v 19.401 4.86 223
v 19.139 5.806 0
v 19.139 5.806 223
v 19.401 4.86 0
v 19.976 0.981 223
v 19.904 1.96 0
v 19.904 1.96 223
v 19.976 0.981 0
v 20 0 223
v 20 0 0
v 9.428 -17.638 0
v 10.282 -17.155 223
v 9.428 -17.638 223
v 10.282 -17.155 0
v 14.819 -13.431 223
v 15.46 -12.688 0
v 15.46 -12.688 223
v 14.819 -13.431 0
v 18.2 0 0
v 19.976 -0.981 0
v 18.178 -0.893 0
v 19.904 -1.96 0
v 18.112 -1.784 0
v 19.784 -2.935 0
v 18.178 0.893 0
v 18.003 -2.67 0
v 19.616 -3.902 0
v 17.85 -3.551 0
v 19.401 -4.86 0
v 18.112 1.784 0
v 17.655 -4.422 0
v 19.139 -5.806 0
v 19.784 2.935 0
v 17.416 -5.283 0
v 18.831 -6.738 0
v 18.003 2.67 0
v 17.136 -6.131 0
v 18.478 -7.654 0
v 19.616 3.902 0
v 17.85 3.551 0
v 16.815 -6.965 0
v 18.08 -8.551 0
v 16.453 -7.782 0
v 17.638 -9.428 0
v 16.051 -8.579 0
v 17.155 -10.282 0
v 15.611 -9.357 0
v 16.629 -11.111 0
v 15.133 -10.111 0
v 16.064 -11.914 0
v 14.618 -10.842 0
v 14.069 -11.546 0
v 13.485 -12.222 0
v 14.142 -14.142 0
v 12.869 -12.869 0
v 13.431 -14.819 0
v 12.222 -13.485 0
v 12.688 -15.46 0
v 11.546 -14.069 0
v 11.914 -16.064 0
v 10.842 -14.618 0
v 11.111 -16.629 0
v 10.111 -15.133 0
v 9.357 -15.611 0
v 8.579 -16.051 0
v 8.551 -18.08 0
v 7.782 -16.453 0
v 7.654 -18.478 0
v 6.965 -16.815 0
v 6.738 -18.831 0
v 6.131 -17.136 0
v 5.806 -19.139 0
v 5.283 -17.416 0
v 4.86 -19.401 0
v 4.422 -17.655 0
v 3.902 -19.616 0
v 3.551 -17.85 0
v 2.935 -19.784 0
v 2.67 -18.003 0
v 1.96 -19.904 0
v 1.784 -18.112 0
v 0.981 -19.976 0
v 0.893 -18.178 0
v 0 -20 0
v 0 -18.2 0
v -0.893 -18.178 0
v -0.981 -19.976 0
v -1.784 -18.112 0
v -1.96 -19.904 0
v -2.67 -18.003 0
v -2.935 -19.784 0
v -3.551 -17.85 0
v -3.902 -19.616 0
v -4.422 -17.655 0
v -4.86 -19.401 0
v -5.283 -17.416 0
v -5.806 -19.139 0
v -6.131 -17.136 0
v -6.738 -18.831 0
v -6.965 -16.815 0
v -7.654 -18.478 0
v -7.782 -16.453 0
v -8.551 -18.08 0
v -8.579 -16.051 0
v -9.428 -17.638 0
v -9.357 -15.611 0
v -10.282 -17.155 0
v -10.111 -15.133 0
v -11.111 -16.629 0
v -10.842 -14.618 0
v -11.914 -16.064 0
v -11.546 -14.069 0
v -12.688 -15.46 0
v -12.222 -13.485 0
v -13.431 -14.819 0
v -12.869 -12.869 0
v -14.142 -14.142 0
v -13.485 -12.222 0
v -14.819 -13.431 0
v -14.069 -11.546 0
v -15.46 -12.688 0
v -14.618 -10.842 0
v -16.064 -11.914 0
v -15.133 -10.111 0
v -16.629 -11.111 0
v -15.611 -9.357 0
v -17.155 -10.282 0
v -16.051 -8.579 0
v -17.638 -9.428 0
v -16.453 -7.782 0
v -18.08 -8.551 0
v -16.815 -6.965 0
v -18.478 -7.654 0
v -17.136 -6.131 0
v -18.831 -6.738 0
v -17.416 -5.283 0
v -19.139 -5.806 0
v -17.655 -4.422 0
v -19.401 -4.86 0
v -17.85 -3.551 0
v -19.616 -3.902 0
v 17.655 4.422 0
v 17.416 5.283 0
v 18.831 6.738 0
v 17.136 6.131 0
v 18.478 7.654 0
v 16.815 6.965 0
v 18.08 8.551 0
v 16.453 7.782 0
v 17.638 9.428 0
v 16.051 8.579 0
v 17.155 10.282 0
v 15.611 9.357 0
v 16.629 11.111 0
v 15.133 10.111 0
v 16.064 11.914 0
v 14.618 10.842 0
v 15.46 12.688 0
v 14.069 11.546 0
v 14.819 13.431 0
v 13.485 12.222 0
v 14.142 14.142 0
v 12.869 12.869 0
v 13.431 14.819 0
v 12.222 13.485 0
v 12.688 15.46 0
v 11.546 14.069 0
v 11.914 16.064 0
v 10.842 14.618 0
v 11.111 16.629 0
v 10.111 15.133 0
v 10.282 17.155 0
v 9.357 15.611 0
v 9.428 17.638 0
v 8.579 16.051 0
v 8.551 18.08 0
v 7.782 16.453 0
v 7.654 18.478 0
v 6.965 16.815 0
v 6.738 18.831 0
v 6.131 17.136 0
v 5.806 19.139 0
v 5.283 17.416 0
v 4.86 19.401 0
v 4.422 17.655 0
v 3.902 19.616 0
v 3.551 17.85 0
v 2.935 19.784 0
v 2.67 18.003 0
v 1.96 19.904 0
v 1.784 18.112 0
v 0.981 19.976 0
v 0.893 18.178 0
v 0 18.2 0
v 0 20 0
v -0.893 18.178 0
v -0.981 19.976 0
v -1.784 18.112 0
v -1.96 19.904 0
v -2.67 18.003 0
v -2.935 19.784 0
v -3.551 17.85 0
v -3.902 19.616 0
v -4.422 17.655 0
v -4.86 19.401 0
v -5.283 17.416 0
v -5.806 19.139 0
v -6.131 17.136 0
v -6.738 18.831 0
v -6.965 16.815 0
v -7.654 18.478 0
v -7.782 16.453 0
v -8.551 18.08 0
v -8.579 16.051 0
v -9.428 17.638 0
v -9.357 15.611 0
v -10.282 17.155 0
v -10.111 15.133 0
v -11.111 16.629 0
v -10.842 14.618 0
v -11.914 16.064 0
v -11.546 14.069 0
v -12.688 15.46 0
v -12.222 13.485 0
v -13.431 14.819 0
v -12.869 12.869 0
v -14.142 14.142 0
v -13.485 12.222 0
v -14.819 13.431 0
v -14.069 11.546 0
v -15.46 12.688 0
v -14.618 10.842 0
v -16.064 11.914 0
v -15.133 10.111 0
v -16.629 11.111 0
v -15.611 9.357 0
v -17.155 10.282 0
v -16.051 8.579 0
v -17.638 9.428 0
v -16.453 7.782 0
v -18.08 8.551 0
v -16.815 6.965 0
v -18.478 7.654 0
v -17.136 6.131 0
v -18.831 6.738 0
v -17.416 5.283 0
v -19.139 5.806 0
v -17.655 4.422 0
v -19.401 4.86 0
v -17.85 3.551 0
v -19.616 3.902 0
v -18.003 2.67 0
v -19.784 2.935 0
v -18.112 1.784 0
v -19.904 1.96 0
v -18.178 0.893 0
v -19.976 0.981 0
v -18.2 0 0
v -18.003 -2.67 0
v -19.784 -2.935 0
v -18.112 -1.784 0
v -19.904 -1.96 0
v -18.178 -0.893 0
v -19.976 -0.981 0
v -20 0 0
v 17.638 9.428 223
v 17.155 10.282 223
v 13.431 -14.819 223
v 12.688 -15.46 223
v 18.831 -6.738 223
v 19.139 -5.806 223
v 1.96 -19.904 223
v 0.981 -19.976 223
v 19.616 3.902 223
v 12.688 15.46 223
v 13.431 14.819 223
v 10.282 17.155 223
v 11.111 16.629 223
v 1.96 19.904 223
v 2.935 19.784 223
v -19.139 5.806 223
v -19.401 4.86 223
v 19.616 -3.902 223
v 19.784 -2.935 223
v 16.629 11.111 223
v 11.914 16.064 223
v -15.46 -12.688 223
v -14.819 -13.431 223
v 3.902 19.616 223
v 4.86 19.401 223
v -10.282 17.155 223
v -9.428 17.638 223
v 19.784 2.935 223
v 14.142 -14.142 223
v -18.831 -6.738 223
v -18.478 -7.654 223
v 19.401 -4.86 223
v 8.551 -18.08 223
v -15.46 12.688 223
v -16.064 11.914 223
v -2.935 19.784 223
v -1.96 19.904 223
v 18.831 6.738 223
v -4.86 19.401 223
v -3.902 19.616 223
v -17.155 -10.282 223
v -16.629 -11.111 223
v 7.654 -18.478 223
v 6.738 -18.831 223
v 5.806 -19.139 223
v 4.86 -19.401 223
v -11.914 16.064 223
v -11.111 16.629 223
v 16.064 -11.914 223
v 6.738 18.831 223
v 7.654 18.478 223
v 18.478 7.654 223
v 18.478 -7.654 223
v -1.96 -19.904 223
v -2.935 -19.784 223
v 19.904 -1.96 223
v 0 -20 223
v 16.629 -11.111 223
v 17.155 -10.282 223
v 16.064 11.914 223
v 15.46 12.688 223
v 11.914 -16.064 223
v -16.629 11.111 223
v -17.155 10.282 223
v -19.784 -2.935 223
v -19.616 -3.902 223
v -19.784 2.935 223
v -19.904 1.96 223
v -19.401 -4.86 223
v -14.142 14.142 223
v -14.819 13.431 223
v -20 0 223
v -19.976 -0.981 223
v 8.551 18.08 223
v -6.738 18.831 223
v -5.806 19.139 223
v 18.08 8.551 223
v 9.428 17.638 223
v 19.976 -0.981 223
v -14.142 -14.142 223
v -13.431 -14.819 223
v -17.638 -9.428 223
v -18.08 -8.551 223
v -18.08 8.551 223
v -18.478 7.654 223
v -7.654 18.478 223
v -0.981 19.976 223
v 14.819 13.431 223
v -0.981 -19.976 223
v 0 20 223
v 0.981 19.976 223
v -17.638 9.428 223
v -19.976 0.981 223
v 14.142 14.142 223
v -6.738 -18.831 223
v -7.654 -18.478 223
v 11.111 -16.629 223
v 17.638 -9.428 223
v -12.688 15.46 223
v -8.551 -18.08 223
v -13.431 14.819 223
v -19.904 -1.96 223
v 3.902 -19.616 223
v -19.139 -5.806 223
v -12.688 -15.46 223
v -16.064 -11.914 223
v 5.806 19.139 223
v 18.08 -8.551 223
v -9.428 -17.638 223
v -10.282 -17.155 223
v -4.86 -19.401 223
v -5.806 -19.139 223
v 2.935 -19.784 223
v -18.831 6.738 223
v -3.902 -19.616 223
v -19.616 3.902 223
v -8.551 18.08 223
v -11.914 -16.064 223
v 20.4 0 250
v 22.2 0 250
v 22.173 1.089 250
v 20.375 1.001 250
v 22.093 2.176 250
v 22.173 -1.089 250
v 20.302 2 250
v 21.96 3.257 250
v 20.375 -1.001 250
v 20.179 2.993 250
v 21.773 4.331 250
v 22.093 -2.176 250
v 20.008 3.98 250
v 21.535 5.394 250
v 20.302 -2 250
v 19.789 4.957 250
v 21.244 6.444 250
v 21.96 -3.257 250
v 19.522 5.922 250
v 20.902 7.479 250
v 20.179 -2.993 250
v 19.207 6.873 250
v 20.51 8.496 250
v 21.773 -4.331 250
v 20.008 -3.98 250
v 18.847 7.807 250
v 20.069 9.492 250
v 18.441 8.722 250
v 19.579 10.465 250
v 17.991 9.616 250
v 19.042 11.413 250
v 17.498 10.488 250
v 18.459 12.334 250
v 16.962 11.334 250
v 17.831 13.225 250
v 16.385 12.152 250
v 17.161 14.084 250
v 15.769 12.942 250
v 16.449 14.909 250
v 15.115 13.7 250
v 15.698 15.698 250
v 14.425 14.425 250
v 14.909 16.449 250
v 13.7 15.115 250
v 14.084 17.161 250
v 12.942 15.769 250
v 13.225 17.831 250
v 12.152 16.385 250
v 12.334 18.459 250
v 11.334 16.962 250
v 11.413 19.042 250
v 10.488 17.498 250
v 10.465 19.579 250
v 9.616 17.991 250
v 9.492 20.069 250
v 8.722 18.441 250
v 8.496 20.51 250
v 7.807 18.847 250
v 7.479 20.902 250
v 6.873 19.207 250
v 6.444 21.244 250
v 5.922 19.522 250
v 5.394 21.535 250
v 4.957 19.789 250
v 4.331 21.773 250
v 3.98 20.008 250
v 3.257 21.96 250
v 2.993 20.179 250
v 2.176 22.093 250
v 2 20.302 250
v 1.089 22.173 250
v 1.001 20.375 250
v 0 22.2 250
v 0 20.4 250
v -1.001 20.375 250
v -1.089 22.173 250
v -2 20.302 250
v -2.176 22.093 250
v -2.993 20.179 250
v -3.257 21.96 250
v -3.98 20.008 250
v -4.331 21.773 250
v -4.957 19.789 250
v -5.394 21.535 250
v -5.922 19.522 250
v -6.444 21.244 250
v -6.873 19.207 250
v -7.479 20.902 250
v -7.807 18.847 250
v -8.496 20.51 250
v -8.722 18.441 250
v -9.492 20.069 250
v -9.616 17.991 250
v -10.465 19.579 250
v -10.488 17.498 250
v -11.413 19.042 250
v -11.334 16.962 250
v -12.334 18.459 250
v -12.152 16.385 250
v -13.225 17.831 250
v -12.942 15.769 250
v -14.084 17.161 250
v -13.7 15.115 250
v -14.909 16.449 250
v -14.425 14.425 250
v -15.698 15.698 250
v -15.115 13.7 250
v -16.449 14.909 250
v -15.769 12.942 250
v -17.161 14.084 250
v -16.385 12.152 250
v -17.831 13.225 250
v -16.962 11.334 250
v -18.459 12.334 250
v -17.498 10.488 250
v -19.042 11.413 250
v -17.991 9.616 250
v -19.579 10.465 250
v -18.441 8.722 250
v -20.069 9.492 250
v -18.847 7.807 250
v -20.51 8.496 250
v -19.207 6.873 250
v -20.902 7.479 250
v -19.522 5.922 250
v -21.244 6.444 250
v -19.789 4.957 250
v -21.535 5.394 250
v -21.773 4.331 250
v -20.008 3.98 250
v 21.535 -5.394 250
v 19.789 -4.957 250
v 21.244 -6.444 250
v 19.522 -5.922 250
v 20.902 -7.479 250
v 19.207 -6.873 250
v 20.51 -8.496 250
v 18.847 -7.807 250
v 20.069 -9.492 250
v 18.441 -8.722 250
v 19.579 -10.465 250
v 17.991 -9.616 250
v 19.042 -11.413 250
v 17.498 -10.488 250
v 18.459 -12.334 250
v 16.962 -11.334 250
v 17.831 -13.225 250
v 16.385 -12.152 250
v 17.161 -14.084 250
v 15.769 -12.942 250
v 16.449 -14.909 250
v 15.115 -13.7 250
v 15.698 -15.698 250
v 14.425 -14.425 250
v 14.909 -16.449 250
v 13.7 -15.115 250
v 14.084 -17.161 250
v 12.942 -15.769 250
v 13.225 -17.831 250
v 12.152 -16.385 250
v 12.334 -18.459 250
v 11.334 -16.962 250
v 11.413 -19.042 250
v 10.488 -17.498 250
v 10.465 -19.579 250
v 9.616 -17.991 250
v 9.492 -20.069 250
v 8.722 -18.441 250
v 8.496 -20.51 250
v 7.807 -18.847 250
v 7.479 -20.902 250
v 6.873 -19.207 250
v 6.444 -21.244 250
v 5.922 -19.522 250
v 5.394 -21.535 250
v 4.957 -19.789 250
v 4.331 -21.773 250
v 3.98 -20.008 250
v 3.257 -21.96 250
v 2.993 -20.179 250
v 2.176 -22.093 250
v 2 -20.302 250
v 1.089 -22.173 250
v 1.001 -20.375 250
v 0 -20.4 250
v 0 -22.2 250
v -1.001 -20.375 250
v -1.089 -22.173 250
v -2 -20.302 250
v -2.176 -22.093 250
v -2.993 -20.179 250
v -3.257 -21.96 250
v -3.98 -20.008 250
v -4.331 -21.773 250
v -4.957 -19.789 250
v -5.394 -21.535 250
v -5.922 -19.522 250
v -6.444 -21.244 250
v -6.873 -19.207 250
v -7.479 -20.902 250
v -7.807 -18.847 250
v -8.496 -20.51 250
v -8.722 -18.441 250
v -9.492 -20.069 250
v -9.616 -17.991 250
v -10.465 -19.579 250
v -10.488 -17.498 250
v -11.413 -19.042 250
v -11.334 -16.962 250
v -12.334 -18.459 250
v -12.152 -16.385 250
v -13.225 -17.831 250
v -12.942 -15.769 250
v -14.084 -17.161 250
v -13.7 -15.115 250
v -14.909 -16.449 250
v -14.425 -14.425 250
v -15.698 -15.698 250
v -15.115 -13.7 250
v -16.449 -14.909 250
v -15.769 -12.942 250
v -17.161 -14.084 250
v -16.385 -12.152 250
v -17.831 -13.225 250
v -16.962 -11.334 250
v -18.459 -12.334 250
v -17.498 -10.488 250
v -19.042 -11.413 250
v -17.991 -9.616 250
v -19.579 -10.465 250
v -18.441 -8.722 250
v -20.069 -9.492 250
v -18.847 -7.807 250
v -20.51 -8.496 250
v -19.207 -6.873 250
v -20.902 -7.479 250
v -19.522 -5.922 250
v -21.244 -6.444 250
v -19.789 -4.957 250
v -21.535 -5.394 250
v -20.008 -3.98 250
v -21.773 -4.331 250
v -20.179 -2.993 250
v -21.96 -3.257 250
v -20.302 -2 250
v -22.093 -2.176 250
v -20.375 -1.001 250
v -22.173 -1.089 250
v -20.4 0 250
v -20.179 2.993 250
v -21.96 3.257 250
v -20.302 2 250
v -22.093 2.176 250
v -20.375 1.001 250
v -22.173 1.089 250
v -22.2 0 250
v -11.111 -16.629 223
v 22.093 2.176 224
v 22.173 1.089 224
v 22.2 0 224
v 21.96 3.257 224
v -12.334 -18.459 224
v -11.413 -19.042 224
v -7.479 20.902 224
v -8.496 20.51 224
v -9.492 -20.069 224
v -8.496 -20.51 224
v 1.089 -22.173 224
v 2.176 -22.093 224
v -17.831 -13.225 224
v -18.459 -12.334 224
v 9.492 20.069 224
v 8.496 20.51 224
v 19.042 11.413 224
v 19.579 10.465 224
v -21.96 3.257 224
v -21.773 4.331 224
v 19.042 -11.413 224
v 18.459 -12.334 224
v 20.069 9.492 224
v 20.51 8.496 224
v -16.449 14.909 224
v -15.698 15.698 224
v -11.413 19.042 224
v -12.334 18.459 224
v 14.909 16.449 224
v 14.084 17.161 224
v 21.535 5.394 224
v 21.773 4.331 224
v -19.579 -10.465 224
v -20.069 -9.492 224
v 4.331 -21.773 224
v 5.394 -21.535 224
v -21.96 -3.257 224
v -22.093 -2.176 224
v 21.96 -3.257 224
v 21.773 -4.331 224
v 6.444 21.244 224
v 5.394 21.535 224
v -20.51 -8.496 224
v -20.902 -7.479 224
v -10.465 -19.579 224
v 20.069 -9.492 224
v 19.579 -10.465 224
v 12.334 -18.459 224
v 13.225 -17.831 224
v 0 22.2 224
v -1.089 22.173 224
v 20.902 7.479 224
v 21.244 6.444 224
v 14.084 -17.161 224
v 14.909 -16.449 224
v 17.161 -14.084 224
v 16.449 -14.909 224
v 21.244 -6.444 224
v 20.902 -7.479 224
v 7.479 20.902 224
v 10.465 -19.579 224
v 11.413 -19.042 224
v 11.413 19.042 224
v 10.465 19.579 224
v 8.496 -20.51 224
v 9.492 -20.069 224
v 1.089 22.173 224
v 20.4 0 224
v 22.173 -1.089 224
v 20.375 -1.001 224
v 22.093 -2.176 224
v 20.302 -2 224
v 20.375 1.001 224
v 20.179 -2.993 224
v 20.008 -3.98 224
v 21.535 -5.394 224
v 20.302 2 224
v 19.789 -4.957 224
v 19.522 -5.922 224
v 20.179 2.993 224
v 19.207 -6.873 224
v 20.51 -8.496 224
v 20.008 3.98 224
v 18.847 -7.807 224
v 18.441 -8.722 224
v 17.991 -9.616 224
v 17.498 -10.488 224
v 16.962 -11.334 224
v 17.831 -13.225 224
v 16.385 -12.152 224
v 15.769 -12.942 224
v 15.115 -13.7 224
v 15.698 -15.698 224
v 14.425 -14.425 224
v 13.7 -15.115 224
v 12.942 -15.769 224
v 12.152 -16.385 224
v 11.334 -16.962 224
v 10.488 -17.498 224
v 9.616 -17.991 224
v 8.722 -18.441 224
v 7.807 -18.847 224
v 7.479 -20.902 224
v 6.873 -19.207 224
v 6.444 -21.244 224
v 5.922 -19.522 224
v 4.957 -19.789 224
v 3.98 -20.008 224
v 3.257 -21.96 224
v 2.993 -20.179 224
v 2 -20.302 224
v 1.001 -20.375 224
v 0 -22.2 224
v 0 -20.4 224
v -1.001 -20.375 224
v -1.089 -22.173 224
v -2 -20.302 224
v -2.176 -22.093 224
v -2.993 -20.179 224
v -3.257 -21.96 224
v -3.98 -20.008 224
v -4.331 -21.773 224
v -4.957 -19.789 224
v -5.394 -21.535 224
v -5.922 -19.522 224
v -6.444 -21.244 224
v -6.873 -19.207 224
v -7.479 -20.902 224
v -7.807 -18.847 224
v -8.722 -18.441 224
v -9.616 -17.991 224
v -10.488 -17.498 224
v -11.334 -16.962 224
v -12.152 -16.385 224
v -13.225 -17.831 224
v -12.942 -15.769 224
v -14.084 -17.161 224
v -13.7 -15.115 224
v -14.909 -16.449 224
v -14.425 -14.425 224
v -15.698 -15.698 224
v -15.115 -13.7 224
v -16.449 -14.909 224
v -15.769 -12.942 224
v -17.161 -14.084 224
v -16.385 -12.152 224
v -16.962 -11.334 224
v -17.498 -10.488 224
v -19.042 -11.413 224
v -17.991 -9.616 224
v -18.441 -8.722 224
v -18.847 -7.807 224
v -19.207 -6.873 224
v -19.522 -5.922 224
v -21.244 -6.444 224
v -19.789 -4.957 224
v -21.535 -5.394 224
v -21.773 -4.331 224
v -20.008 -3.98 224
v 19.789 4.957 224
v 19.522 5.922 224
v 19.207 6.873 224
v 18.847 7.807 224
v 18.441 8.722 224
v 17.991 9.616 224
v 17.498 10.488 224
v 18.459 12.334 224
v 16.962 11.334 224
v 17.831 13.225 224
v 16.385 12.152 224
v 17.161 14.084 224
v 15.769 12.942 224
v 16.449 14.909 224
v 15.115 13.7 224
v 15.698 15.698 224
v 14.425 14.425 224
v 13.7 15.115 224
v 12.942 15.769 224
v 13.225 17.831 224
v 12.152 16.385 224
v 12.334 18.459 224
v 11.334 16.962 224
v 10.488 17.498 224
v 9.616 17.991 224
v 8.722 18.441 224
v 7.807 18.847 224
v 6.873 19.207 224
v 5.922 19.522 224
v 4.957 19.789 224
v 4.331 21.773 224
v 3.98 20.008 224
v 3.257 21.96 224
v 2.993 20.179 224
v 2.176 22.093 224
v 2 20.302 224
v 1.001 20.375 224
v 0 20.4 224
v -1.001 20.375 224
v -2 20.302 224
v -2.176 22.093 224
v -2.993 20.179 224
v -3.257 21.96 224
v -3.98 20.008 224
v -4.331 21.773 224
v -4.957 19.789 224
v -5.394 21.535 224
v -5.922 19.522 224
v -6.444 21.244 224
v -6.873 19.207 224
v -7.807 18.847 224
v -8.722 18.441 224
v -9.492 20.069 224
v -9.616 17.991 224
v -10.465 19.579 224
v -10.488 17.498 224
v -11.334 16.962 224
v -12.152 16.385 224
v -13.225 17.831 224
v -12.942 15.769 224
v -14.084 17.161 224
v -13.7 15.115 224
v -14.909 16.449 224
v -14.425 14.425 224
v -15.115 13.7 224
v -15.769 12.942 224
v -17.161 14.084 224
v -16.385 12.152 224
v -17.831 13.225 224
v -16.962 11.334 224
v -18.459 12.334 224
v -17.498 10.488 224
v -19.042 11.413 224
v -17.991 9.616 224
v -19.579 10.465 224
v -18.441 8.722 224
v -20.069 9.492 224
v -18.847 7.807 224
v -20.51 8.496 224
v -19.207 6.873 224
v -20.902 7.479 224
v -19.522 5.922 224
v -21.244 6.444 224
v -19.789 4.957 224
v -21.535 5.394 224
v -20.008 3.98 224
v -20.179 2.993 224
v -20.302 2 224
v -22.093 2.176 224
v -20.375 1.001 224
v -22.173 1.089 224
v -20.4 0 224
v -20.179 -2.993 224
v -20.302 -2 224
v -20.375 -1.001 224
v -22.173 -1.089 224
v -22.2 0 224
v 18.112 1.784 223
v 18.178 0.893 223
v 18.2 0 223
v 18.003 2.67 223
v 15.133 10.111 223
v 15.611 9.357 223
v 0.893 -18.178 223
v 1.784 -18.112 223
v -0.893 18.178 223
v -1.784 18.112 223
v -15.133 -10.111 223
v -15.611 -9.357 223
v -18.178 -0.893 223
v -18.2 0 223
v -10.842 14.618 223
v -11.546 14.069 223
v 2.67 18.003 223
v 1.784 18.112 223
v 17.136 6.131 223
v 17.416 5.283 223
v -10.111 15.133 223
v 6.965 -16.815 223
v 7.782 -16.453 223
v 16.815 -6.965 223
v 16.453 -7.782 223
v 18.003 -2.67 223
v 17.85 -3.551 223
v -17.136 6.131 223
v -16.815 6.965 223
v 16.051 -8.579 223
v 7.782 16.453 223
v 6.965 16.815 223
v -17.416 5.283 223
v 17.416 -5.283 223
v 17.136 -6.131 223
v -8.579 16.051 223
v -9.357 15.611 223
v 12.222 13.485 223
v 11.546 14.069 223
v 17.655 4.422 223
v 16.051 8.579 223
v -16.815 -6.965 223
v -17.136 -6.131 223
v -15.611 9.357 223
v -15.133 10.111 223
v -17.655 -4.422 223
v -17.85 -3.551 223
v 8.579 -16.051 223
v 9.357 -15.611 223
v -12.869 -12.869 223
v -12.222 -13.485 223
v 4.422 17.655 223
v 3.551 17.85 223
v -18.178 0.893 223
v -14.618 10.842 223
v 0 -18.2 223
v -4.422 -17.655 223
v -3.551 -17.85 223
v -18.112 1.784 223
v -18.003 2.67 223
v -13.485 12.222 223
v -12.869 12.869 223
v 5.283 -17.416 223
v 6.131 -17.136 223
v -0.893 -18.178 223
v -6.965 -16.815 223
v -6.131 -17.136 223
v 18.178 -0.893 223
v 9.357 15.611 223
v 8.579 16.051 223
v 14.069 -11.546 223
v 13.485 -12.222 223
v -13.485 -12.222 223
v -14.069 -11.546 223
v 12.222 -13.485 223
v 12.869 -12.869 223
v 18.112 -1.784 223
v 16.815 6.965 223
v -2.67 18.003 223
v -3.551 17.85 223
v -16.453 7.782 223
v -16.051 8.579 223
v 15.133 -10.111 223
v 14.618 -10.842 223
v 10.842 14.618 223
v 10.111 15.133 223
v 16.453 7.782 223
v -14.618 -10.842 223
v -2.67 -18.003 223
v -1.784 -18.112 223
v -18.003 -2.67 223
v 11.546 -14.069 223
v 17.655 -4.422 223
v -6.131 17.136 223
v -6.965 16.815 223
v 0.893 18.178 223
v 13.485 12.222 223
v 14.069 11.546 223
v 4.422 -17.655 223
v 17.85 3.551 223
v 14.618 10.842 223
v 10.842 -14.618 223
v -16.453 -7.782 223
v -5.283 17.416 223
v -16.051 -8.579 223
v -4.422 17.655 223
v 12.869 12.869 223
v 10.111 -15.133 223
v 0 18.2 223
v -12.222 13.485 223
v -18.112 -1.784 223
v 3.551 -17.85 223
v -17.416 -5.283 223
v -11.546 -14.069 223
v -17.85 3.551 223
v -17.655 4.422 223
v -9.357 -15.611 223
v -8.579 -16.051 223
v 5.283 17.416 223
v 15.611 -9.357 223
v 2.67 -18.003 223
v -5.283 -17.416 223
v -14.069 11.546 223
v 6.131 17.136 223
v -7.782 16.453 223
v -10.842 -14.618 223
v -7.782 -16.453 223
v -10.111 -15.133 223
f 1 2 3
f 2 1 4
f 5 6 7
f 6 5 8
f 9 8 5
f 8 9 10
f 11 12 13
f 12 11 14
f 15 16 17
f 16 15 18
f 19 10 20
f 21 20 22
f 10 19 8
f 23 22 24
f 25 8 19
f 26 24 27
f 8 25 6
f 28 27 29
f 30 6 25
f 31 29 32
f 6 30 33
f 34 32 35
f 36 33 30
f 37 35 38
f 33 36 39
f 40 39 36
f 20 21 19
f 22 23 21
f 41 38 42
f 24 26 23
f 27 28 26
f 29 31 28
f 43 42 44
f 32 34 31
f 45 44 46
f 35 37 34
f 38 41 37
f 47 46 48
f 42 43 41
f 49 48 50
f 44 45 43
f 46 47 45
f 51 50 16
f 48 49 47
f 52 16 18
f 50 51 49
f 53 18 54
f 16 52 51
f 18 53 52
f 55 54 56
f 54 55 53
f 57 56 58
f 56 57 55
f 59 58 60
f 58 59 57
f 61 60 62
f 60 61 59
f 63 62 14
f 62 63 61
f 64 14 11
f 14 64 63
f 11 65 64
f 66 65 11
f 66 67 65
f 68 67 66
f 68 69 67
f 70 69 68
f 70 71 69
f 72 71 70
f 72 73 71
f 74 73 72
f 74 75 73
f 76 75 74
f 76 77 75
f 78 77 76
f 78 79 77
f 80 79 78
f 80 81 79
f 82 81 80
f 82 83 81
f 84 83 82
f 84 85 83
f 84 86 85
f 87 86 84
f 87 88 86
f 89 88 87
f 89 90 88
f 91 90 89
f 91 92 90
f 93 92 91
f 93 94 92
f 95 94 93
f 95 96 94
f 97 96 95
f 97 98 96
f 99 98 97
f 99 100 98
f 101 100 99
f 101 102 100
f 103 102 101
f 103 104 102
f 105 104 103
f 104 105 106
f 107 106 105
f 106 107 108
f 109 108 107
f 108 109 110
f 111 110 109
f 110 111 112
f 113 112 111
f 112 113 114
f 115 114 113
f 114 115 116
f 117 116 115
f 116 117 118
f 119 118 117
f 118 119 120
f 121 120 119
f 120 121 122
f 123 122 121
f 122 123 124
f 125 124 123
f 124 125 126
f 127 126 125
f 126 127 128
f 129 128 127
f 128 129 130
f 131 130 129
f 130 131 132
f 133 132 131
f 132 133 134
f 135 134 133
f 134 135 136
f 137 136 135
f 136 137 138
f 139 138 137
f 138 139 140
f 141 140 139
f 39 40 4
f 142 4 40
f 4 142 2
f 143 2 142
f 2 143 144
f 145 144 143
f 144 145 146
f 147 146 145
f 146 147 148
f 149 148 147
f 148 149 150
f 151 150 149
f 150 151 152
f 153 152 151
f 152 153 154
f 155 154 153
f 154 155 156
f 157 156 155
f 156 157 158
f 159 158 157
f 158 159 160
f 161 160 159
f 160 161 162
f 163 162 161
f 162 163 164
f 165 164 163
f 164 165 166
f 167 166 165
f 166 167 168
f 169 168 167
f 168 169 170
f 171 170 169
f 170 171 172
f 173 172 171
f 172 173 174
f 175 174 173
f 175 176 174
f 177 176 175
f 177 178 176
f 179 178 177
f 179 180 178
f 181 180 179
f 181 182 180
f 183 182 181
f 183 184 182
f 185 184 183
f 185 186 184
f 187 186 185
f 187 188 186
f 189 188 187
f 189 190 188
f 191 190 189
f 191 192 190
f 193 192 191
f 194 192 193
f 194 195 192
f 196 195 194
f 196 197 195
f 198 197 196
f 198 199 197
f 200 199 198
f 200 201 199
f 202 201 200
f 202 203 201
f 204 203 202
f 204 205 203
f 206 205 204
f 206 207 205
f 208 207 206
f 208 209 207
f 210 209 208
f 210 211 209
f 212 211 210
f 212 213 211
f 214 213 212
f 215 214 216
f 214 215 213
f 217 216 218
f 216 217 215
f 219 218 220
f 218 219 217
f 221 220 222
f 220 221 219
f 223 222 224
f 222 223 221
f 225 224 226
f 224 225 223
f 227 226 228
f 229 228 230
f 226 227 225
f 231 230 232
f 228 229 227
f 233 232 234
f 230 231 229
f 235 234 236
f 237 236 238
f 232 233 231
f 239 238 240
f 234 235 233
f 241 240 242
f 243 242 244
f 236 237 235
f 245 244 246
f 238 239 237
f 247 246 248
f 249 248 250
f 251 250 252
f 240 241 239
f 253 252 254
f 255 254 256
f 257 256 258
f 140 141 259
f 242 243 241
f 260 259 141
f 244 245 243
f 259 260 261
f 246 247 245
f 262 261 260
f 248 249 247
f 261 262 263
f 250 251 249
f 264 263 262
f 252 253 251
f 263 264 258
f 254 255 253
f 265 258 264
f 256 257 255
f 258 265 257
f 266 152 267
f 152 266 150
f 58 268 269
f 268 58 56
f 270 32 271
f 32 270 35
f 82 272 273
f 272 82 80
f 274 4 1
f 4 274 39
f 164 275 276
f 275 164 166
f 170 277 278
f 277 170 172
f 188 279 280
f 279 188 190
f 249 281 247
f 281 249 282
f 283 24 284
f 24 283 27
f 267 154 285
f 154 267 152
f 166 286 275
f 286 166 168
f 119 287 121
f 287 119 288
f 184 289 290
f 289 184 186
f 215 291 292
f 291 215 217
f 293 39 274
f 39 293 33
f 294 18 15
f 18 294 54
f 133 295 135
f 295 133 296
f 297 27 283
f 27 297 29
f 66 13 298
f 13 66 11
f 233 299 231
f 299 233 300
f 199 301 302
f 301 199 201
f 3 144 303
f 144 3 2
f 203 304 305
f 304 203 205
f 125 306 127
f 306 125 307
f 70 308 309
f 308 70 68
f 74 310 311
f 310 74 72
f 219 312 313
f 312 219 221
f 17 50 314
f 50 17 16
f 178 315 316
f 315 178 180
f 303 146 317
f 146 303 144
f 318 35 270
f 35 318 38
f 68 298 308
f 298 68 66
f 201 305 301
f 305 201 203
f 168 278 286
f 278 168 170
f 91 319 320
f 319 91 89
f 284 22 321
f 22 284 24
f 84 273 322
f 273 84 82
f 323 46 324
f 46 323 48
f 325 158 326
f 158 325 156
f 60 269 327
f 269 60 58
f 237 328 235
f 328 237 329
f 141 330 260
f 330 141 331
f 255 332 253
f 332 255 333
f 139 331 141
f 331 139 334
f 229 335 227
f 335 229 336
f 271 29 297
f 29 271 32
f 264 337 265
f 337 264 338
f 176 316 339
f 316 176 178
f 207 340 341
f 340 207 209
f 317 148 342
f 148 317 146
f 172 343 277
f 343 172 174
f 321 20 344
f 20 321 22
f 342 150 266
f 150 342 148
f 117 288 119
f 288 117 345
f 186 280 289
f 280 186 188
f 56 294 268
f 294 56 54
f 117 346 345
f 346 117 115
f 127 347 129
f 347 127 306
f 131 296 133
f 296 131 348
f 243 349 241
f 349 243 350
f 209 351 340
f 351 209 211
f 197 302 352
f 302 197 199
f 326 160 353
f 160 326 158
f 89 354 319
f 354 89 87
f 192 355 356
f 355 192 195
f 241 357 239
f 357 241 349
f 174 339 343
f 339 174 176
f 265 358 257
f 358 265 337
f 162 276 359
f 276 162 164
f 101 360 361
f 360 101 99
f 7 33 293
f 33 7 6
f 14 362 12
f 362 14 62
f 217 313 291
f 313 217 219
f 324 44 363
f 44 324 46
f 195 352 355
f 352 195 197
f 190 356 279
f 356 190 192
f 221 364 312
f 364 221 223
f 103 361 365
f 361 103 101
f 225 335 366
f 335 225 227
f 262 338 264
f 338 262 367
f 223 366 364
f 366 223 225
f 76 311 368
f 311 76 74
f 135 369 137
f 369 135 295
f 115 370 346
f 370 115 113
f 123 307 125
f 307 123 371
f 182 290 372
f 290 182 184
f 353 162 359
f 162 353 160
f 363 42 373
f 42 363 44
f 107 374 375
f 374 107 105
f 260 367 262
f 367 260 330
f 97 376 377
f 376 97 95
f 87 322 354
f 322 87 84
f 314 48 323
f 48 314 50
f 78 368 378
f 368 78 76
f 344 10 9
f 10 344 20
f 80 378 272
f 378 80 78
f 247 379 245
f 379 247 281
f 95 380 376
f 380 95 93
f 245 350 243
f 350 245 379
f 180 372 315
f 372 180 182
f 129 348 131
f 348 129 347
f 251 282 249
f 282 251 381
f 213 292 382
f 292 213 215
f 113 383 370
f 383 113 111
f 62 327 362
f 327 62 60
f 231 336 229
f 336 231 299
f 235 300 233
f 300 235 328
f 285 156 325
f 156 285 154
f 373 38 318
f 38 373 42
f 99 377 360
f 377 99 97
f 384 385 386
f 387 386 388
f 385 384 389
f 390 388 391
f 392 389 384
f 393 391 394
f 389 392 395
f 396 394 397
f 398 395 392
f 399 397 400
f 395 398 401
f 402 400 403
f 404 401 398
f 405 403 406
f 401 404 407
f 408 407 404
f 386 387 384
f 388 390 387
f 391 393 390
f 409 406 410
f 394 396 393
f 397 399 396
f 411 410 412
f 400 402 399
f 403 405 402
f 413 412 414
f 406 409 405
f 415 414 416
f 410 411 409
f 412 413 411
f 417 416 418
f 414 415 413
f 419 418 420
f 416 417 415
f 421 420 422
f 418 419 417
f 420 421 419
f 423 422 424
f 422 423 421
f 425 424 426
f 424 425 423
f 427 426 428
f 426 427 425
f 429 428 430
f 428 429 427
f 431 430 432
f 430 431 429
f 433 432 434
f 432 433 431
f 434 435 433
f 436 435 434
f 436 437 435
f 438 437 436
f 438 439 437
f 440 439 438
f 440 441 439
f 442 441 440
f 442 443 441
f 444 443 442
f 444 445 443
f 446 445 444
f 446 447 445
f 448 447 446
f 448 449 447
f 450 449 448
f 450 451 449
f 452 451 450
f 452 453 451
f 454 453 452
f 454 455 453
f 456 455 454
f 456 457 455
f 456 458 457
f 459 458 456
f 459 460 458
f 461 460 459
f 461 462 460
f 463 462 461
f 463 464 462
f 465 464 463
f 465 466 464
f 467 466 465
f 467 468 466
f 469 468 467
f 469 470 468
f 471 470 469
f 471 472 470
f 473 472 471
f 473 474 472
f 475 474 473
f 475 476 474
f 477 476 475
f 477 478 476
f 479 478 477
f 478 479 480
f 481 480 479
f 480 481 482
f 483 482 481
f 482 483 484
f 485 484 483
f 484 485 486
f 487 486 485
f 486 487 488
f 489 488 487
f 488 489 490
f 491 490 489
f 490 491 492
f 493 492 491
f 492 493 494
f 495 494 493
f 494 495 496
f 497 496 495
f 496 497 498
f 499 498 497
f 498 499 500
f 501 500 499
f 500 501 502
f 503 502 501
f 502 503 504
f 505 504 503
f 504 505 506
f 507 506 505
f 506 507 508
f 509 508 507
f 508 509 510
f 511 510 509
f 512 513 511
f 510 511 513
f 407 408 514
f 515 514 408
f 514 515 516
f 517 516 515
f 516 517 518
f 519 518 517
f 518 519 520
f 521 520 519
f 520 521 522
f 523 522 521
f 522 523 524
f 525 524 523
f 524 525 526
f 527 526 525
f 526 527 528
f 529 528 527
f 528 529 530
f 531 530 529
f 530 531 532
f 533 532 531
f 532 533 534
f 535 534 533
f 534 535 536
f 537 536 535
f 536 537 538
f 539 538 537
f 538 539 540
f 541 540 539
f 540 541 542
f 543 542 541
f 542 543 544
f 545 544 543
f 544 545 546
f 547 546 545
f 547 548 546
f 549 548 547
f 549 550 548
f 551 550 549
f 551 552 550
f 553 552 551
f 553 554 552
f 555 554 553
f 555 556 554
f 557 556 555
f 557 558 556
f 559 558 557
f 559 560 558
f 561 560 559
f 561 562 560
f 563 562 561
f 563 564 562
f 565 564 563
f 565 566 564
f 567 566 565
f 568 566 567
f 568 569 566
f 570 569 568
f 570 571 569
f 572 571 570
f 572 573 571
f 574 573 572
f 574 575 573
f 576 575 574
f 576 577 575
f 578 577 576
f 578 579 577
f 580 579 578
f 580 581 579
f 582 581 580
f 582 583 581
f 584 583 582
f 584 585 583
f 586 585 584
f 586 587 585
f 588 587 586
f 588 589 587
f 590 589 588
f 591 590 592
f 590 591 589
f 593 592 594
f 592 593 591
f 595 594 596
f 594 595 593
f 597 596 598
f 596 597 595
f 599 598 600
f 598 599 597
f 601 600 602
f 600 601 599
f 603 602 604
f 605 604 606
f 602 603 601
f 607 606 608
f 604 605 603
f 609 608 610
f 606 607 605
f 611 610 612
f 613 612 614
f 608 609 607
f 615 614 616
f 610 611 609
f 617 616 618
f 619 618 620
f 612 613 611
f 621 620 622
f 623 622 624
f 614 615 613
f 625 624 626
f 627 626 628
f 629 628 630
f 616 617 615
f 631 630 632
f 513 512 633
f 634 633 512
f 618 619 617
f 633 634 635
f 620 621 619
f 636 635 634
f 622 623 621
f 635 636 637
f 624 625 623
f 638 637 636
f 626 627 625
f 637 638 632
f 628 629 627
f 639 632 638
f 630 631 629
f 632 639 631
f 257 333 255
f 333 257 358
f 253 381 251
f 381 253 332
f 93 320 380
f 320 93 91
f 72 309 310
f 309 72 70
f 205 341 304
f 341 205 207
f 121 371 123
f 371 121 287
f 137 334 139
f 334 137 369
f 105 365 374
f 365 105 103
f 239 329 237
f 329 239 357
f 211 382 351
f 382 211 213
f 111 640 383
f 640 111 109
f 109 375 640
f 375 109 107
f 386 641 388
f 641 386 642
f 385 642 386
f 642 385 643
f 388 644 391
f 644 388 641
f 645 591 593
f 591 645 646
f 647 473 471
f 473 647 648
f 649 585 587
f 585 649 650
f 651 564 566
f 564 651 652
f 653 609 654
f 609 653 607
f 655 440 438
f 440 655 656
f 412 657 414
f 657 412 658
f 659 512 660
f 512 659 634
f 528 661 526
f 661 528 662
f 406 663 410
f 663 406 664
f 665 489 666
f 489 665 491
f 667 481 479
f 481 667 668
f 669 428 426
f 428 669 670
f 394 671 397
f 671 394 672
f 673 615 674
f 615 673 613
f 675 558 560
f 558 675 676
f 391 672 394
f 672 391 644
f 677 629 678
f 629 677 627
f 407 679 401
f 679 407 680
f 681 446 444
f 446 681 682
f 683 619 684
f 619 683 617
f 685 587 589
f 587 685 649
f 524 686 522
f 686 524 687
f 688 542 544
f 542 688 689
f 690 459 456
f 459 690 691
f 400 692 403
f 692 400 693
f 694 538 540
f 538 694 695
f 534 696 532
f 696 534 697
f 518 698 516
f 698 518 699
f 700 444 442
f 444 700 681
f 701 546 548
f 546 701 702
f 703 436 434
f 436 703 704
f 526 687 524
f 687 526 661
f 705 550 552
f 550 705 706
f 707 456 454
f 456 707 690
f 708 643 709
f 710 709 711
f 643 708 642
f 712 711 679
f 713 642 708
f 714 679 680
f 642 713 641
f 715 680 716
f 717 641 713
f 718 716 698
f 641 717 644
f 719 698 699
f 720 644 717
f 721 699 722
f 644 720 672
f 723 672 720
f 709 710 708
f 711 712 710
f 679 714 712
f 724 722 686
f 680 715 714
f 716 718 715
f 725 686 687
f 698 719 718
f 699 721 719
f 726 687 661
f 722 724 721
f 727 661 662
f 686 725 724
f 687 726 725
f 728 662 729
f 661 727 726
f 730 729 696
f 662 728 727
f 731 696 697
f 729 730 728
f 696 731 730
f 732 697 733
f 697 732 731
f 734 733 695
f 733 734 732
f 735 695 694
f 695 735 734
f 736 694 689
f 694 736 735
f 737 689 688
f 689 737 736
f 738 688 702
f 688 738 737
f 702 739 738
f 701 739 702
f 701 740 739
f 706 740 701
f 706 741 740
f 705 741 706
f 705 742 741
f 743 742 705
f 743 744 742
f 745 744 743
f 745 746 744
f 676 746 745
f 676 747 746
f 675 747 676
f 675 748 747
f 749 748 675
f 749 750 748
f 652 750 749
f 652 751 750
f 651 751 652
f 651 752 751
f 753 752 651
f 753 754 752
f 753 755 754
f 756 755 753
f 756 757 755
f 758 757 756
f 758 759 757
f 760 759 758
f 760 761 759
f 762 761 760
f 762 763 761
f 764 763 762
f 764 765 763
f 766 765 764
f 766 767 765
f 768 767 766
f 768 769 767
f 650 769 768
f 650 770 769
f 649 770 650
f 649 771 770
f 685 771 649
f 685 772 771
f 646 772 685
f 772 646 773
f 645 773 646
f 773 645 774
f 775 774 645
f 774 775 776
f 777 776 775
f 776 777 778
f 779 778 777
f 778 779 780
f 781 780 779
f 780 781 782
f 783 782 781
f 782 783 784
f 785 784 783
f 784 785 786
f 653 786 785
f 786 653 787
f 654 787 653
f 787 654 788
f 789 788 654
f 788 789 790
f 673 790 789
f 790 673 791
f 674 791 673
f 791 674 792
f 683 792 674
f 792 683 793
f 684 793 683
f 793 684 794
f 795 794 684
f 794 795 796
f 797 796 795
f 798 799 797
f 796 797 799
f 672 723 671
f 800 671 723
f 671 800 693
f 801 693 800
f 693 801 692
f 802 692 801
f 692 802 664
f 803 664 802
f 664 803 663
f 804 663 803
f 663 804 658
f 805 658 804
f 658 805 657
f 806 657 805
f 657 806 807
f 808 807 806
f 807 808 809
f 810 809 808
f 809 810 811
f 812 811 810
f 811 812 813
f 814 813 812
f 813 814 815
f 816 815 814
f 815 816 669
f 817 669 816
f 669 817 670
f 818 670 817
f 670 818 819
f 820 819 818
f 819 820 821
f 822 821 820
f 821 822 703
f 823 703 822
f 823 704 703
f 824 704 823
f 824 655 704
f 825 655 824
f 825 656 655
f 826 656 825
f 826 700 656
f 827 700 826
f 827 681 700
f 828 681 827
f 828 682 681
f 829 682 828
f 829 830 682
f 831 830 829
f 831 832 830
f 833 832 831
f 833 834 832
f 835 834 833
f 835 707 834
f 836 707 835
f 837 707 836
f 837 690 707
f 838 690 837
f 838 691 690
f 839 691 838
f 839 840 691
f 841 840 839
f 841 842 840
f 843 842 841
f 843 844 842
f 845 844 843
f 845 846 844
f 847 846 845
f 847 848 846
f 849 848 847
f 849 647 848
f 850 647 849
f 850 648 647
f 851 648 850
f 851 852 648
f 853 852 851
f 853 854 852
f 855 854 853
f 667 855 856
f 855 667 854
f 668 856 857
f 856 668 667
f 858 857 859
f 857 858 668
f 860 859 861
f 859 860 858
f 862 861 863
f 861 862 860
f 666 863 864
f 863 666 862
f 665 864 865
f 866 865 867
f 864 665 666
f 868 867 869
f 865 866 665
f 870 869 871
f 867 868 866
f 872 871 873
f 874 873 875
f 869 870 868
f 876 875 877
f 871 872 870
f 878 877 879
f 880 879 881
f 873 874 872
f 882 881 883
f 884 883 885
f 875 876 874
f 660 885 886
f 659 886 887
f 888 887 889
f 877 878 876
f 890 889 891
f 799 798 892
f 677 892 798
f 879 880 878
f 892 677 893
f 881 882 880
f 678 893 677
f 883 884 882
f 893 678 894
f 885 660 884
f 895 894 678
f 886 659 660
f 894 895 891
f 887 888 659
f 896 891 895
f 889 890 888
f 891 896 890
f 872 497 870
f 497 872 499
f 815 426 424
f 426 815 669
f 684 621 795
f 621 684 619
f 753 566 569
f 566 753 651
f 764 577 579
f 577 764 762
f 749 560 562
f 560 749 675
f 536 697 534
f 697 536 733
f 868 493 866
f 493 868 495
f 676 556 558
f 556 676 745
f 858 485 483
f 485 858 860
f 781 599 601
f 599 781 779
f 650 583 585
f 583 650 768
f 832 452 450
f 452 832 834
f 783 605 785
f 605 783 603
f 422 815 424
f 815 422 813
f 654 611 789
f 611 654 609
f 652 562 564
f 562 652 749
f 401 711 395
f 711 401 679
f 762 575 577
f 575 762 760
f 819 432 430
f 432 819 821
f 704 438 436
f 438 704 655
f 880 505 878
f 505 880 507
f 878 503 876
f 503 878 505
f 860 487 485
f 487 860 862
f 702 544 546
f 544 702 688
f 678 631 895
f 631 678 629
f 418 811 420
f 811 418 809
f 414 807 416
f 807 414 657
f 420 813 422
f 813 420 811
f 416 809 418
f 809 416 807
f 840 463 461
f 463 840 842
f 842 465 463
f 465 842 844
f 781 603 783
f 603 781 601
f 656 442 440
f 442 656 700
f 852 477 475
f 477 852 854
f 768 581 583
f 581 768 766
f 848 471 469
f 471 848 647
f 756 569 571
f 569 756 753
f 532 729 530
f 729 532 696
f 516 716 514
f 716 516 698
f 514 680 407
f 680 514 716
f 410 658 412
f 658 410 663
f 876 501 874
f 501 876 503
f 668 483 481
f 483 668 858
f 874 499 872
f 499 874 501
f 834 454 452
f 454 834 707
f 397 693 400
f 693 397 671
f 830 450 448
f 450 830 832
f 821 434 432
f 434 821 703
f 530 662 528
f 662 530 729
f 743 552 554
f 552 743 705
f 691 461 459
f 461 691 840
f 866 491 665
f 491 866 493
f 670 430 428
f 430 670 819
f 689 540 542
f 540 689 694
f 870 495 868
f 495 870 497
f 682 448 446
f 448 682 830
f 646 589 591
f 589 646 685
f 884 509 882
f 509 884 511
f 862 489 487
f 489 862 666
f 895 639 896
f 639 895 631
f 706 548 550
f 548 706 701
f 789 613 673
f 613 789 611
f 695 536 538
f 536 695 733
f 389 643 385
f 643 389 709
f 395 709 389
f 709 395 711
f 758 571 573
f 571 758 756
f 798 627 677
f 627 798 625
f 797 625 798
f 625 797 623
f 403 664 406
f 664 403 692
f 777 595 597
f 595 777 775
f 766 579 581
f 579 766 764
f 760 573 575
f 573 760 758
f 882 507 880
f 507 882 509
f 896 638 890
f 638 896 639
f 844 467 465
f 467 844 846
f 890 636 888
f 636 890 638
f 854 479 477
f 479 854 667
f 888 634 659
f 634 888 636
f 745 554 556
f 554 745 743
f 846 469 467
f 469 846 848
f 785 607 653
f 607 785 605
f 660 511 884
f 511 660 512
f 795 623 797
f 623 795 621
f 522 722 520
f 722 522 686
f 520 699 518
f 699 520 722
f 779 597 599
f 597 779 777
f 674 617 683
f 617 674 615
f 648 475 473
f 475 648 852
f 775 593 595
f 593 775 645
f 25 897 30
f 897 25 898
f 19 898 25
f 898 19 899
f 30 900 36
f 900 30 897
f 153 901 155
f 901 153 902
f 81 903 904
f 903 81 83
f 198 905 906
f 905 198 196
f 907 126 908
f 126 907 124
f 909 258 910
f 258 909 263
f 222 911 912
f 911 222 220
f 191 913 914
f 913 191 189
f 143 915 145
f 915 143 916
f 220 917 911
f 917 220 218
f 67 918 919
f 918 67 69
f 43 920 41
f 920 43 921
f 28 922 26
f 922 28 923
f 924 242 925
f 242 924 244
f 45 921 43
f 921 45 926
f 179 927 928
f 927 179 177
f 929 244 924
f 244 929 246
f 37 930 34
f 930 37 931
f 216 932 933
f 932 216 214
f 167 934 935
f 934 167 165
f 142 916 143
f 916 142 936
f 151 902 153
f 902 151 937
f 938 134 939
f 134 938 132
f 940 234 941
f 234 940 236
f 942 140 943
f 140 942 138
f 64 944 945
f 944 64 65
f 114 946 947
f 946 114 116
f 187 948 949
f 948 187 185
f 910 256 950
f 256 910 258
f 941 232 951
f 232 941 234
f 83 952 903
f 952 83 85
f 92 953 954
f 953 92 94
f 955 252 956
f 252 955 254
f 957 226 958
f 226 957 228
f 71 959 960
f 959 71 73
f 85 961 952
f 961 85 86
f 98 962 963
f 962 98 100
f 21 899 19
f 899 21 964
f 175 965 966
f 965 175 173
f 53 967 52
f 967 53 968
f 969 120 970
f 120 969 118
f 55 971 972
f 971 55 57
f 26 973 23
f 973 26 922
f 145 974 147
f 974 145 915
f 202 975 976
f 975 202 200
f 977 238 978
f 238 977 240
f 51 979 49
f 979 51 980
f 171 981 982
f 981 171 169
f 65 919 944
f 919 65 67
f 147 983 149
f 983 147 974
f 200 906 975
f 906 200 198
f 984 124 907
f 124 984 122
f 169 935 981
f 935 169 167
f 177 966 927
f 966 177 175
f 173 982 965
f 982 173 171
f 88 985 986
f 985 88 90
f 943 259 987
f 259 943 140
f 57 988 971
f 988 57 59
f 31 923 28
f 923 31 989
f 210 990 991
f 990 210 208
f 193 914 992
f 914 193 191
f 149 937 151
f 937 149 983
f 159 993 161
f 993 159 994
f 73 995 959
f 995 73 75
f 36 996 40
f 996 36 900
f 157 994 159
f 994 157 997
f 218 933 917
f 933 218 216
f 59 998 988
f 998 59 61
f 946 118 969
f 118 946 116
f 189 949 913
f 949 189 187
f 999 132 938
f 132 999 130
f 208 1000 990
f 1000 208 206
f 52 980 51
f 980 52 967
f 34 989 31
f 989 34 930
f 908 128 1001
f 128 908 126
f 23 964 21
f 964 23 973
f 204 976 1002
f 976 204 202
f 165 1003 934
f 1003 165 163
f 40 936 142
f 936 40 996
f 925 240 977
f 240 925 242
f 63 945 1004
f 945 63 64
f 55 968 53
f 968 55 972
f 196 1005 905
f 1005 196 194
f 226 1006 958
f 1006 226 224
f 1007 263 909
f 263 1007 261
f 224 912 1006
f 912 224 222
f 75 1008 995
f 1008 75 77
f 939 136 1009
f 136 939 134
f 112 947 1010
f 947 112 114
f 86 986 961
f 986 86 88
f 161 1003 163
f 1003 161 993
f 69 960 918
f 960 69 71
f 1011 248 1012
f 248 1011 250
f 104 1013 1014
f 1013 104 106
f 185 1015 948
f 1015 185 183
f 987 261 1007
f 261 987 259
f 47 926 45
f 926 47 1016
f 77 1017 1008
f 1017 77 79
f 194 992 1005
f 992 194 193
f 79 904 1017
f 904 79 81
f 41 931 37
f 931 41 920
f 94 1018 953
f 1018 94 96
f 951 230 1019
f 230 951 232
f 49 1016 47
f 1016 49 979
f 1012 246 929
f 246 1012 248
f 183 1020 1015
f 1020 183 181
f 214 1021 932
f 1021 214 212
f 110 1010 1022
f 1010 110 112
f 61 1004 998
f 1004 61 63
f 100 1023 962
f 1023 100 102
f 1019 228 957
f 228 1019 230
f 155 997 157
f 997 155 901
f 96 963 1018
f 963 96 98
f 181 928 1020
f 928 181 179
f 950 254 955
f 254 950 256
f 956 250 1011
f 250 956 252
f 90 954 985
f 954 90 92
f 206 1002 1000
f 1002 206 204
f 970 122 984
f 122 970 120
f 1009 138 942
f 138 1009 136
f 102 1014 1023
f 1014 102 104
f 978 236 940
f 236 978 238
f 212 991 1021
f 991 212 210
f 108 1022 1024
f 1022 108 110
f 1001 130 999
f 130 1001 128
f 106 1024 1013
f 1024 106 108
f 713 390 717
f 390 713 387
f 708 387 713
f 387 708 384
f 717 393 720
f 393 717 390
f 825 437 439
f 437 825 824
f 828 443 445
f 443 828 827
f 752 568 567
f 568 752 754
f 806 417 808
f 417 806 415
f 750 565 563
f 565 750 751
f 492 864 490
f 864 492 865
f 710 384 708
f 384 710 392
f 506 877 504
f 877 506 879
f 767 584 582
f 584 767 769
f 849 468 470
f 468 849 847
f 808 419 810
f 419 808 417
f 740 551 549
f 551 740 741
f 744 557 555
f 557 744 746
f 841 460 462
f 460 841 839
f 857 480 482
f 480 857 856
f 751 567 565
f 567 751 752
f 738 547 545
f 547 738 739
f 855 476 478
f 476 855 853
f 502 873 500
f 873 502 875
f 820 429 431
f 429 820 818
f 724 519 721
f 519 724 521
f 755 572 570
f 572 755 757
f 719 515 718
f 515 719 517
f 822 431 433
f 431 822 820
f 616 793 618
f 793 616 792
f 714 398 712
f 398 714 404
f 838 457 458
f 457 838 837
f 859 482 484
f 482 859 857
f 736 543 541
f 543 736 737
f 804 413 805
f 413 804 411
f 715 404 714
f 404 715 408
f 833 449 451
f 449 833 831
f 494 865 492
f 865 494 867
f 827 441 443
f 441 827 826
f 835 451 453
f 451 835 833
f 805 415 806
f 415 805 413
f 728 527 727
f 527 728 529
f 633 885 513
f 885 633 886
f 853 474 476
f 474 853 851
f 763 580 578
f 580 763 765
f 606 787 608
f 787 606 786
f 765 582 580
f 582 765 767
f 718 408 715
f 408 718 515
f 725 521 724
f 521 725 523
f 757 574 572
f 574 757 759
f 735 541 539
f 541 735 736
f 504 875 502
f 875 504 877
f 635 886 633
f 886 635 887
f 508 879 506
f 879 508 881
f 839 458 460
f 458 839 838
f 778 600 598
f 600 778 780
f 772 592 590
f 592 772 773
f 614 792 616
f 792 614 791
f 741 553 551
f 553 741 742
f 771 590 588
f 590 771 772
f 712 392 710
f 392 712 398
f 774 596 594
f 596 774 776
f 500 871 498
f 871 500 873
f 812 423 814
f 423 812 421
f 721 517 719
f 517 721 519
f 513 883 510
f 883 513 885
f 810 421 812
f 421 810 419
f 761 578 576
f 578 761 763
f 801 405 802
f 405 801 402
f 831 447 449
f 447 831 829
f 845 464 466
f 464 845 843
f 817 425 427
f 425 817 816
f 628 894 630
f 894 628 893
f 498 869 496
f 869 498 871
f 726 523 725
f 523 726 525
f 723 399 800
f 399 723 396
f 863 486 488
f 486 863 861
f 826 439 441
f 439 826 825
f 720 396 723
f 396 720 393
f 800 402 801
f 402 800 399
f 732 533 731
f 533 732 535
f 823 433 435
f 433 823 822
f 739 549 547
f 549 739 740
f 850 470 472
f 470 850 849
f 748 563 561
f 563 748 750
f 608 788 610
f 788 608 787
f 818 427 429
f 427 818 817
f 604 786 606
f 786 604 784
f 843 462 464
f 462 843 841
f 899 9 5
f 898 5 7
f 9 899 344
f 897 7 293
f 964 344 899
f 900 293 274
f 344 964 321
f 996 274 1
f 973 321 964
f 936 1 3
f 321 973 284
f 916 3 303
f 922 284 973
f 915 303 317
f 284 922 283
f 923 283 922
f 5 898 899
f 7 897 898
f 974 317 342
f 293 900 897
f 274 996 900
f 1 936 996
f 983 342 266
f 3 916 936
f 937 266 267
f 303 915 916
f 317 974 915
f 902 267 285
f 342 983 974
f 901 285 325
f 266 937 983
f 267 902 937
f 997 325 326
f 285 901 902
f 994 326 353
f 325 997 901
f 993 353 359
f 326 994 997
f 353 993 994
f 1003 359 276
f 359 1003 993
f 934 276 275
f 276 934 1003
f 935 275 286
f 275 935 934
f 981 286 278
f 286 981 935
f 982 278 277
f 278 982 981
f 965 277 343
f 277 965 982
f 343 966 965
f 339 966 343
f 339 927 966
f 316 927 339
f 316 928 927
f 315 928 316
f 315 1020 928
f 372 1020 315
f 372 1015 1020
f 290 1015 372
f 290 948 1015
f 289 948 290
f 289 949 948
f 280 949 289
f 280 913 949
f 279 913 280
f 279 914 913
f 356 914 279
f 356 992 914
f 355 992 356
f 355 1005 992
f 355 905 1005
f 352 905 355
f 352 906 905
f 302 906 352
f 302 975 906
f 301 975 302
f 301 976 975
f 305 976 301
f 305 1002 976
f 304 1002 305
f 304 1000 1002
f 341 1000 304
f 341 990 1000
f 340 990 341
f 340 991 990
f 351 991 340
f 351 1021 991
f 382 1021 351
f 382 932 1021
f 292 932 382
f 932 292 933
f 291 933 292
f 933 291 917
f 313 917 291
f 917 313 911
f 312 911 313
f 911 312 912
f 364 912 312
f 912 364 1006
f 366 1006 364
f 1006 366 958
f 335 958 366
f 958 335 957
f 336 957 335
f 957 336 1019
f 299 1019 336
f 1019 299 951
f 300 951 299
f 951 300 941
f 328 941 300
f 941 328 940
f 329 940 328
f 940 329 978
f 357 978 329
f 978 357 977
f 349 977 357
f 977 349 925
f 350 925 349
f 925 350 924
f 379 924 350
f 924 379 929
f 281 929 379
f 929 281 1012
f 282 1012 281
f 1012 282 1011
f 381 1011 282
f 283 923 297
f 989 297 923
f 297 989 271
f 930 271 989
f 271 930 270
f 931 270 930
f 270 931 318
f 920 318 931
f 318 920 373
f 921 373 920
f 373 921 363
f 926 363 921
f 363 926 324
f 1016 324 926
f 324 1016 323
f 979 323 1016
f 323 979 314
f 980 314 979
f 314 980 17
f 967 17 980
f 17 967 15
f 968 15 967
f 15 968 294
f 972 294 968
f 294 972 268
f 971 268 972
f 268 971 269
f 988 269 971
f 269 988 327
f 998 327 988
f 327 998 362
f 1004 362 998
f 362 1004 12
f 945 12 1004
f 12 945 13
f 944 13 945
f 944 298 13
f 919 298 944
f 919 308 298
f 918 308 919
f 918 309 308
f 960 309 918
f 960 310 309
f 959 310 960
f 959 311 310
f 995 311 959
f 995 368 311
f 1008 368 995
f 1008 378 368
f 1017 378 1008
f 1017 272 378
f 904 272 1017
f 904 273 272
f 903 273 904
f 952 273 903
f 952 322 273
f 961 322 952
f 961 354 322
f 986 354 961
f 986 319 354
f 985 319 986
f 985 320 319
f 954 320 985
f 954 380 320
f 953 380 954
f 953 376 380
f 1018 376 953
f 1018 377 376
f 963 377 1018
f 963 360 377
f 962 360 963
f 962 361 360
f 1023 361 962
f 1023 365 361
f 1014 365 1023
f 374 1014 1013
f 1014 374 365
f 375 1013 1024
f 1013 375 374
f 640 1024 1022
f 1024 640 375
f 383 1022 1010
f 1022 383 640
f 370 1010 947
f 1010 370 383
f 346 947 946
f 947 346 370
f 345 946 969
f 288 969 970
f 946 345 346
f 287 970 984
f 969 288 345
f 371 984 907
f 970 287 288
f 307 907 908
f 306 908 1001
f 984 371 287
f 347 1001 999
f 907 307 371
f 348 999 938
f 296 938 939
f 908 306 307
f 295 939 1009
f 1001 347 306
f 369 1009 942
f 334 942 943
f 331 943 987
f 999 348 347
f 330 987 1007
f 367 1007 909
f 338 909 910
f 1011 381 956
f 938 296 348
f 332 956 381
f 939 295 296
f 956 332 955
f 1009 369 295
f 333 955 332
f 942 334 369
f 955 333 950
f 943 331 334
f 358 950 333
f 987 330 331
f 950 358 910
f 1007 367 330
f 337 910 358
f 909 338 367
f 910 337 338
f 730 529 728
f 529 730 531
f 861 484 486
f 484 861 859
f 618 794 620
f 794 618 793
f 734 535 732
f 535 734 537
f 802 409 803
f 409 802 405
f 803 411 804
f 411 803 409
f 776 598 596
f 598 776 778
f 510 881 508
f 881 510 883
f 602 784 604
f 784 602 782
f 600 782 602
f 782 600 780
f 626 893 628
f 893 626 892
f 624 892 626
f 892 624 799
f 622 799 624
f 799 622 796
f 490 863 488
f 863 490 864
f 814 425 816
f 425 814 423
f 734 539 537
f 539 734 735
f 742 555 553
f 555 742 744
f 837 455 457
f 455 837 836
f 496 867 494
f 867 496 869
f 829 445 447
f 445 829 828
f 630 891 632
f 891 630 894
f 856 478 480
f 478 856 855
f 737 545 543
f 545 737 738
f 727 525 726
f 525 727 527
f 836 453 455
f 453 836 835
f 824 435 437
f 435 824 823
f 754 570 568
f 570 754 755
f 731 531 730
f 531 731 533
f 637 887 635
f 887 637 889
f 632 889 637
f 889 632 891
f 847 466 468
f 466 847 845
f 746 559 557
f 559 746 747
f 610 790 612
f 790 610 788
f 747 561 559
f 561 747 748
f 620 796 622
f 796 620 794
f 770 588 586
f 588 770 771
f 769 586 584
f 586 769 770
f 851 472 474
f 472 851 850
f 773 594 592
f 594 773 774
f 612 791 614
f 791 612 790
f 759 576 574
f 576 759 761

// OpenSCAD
$fn = 128;

// Parameters
nominal_diameter = 40; //[20:80:1]
length_mm = 250; //[125:500:1]
outer_diameter_mm = 40; //[30:60:0.5]
wall_thickness_mm = 1.8; //[0.9:3.6:0.1]
include_end_fitting = 1; //[0:1:1]
overlap_mm = 1; //[0.5:2:0.1]
fitting_length_mm = 25; //[12.5:50:0.5]
fitting_wall_extra_mm = 2.2; //[1.1:4.4:0.1]
fitting_bore_clearance_mm = 0.4; //[0.2:1.0:0.1]

// Derived radii (robust)
outer_r = max(0.01, outer_diameter_mm/2);
inner_r = max(0.01, outer_r - wall_thickness_mm);

// Fitting radii
fitting_outer_r = max(outer_r + 0.01, outer_r + fitting_wall_extra_mm);
fitting_inner_r = max(0.01, outer_r + fitting_bore_clearance_mm);

// Ensure fitting bore is not larger than fitting outer radius
fitting_inner_r_safe = min(fitting_inner_r, fitting_outer_r - 0.01);

// Ensure main bore is not larger than outer radius
inner_r_safe = min(inner_r, outer_r - 0.01);

// Module for the HT Pipe (one connected solid)
module ht_pipe() {
  color([0.85, 0.85, 0.8])
  difference() {
    // OUTER SOLID (connected via overlap)
    union() {
      cylinder(h=length_mm, r=outer_r, center=false);

      if (include_end_fitting)
        translate([0, 0, length_mm - fitting_length_mm - overlap_mm])
          cylinder(h=fitting_length_mm + overlap_mm, r=fitting_outer_r, center=false);
    }

    // INNER VOID (continuous subtraction; extends beyond ends to avoid coplanar faces)
    union() {
      translate([0, 0, -overlap_mm])
        cylinder(h=length_mm + 2*overlap_mm, r=inner_r_safe, center=false);

      if (include_end_fitting)
        translate([0, 0, length_mm - fitting_length_mm - 2*overlap_mm])
          cylinder(h=fitting_length_mm + 4*overlap_mm, r=fitting_inner_r_safe, center=false);
    }
  }
}

// Call
ht_pipe();
